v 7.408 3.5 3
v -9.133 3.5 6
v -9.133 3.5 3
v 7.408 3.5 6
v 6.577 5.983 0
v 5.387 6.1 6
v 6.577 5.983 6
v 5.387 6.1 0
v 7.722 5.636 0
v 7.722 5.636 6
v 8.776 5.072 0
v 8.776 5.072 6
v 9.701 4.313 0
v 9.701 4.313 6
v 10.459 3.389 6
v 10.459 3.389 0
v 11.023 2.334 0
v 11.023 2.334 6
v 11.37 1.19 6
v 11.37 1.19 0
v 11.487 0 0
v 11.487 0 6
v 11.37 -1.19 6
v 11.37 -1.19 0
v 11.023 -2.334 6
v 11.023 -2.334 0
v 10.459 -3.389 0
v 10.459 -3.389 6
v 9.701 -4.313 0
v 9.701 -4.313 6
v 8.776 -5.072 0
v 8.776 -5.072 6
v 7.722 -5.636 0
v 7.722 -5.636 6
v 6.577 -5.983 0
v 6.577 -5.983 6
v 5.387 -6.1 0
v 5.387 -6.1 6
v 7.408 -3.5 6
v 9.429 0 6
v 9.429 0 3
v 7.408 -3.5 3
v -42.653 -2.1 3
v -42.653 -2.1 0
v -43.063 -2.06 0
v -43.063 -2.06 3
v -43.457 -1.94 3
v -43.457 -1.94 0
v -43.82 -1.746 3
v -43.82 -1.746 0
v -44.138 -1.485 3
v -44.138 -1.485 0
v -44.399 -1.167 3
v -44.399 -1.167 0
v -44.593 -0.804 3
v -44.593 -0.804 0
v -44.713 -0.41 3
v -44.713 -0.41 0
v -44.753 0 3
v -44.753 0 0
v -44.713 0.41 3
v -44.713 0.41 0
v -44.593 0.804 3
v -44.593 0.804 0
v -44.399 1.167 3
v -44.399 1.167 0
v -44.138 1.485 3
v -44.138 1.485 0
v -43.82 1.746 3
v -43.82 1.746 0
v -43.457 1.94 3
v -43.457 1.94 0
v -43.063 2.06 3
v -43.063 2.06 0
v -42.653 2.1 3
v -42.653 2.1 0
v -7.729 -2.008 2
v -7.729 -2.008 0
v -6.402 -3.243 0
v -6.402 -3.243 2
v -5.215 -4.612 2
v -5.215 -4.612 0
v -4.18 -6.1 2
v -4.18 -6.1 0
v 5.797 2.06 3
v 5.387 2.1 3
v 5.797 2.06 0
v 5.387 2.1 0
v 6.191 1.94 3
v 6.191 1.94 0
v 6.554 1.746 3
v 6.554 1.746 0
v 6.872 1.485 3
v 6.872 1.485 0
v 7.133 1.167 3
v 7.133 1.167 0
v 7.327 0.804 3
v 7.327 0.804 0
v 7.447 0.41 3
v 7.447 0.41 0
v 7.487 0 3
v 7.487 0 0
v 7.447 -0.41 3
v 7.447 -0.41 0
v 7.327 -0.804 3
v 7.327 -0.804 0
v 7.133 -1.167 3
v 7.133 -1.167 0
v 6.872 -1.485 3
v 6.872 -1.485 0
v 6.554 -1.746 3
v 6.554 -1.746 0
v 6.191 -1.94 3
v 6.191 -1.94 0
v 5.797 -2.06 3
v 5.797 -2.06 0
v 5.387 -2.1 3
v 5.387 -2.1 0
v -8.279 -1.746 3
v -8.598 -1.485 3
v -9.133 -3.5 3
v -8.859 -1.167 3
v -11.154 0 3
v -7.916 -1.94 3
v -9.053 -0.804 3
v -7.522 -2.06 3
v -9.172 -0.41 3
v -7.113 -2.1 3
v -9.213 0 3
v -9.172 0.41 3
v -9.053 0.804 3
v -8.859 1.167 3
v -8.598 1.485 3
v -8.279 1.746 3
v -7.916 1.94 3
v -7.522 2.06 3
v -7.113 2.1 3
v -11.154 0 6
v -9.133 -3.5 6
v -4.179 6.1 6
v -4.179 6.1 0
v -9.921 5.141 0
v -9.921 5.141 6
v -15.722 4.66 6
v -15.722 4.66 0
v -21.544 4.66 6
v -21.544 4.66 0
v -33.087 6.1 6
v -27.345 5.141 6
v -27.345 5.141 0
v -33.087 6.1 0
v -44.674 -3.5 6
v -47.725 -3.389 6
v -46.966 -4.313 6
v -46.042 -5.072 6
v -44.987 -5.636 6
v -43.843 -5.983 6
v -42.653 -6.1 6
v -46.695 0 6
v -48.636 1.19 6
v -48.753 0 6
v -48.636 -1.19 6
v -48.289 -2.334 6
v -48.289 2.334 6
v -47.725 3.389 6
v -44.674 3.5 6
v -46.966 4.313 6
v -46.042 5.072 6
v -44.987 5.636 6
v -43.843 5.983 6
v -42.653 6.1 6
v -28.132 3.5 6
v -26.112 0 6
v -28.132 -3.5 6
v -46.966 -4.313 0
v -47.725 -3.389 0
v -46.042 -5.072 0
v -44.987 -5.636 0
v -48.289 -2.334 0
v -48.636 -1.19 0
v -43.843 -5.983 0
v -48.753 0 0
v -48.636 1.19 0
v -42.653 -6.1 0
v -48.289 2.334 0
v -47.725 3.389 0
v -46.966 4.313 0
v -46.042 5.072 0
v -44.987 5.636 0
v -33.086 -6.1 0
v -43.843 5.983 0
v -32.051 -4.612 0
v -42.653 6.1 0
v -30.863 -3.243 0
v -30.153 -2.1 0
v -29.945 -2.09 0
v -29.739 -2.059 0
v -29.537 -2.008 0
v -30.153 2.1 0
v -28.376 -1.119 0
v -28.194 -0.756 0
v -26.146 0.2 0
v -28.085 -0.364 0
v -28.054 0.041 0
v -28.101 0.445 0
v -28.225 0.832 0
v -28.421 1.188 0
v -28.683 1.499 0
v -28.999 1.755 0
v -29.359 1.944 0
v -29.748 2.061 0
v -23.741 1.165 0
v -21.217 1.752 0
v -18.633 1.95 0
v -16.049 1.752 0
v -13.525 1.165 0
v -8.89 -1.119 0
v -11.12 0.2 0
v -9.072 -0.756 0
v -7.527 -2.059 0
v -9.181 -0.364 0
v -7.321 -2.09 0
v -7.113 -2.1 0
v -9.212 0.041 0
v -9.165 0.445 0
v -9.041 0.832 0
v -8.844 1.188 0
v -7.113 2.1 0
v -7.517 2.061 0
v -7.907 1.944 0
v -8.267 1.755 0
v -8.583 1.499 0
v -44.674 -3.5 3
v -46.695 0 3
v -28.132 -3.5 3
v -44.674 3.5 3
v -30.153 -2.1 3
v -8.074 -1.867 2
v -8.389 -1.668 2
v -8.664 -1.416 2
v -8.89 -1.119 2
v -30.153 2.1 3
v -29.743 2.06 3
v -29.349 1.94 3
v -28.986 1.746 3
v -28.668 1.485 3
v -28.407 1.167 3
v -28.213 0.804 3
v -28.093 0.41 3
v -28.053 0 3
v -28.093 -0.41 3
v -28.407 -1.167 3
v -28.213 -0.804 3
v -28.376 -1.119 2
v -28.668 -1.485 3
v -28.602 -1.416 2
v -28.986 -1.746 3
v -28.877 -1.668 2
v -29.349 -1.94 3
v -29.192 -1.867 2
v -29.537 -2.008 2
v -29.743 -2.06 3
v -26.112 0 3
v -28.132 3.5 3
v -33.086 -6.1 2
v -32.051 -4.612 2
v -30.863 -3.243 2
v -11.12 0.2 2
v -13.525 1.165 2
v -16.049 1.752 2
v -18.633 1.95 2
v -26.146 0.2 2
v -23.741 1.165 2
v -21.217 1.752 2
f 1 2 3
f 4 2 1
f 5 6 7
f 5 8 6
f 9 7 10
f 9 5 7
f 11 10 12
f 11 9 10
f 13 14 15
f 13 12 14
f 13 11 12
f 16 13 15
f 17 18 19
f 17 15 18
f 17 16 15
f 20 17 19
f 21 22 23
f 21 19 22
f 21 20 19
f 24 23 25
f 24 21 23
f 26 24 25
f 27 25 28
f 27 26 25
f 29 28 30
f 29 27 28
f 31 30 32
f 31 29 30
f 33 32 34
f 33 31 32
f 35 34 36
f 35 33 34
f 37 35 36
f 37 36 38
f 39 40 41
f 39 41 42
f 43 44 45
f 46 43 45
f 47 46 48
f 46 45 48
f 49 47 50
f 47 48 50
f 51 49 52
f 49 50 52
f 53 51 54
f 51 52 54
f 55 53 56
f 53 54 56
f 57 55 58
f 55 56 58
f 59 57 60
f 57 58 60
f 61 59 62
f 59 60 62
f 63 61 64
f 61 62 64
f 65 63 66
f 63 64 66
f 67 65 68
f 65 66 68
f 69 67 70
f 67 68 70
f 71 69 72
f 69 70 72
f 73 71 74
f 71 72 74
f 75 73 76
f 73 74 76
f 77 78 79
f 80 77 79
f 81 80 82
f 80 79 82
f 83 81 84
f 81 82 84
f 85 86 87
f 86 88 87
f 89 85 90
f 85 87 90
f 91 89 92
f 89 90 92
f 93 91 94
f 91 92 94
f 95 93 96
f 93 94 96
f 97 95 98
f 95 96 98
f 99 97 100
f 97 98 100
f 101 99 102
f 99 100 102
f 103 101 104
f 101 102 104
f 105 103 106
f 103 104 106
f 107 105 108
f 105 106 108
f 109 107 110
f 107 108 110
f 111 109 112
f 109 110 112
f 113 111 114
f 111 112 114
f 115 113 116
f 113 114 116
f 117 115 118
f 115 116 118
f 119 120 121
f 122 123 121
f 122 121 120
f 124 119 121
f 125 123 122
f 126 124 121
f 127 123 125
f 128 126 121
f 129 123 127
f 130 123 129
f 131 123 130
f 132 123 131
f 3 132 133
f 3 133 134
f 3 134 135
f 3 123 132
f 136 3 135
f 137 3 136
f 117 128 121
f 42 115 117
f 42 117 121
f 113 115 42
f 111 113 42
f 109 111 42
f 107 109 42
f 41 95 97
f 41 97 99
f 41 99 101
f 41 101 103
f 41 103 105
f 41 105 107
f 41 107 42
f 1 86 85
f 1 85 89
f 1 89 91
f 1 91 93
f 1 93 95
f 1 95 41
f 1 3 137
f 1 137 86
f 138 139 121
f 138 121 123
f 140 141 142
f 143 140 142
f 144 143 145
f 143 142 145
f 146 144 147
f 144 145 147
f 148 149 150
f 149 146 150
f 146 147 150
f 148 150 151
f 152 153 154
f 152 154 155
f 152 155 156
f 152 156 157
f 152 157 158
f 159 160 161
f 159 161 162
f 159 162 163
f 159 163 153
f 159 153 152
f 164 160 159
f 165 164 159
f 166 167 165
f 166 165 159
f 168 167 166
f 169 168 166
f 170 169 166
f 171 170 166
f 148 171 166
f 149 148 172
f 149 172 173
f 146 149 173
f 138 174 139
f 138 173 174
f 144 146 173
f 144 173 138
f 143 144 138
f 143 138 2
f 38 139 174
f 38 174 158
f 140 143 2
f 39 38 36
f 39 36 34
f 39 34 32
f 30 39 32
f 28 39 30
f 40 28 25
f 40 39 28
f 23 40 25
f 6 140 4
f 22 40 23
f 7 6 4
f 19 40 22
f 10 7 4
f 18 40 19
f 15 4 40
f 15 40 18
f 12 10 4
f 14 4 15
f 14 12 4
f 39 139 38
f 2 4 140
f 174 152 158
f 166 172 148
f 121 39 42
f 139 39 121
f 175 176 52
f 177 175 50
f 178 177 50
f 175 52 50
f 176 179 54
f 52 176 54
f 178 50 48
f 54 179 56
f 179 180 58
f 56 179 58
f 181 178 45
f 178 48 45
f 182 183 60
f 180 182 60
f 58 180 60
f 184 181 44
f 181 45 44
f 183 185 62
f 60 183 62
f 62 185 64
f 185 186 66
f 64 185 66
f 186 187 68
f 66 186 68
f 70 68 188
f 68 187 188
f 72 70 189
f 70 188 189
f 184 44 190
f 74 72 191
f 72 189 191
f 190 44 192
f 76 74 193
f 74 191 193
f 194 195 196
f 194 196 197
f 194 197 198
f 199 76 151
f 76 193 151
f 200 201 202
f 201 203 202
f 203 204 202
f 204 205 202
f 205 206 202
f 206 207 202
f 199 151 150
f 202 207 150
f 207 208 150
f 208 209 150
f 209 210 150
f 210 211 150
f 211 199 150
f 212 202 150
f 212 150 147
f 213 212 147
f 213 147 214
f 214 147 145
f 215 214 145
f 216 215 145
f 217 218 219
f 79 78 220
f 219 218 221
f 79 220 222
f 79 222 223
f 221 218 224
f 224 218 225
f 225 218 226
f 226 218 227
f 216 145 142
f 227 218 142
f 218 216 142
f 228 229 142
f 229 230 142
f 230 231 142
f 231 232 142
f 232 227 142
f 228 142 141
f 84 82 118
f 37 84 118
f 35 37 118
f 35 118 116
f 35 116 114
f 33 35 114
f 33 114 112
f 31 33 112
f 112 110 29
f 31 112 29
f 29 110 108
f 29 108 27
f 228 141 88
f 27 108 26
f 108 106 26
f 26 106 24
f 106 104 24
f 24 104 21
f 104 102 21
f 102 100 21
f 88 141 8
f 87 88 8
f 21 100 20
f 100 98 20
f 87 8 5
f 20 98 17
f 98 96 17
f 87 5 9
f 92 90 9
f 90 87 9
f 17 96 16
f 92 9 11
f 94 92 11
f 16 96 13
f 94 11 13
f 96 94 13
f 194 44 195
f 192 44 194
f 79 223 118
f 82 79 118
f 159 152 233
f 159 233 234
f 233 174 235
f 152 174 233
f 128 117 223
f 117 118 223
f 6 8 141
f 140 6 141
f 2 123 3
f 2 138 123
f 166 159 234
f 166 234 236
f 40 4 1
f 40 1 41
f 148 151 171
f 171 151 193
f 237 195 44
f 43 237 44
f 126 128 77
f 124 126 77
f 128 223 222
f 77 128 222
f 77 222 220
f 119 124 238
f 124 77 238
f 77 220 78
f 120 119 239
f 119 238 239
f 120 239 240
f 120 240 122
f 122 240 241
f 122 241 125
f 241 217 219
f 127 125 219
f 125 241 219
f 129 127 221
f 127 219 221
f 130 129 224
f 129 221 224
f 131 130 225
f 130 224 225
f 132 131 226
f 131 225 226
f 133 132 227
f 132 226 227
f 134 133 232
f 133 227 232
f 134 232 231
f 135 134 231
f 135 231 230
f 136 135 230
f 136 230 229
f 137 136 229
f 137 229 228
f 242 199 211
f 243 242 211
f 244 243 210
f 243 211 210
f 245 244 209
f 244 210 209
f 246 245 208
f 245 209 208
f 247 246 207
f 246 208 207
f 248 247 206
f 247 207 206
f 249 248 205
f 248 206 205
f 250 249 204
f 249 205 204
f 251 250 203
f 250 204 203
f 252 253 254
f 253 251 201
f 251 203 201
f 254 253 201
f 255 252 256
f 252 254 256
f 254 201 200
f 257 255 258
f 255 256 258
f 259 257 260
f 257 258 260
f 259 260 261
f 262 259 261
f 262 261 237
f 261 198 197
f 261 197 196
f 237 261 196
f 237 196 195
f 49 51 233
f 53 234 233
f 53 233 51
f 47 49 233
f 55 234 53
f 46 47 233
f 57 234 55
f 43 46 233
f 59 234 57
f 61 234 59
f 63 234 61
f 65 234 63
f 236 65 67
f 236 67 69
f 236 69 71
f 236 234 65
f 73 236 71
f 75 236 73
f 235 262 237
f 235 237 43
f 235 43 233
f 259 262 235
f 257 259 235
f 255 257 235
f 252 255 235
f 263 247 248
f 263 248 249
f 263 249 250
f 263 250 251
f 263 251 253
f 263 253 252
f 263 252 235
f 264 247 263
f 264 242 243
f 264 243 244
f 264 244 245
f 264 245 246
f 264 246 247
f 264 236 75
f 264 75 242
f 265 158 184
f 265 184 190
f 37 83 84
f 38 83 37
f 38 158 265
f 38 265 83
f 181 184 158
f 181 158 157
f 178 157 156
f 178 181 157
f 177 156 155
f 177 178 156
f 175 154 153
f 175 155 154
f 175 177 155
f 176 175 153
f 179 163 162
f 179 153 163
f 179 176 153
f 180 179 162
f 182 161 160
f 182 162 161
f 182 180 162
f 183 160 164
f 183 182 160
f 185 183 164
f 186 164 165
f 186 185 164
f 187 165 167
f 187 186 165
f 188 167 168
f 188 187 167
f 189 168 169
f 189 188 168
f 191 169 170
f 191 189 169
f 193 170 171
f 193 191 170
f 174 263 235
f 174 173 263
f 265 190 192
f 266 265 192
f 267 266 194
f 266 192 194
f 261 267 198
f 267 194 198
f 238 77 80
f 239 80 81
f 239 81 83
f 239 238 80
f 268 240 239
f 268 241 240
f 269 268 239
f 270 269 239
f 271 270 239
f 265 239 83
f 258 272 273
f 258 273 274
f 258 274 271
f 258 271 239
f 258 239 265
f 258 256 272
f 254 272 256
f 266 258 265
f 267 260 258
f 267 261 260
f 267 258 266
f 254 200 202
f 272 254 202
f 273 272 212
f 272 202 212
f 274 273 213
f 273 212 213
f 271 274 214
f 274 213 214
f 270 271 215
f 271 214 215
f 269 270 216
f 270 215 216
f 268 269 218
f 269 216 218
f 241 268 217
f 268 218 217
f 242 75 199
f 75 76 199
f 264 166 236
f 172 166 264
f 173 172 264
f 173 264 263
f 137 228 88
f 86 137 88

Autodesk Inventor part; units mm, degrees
ref_plane "YZ Plane" through (0, 0, 0) normal (1, 0, 0) x (0, 1, 0)
ref_plane "XZ Plane" through (0, 0, 0) normal (0, 1, 0) x (-1, 0, 0)
ref_plane "XY Plane" through (0, 0, 0) normal (0, 0, 1) x (1, 0, 0)
sketch "Skizze1" plane through (0, 0, 0) normal (0, 0, 1) x (1, 0, 0)
  line L0 (-30.1531, -2.1) -> (-42.6531, -2.1) projected
  arc A0 (-42.6531, 2.1) -> (-42.6531, -2.1) centre (-42.6531, 0) ccw projected
  line L1 (-42.6531, 2.1) -> (-30.1531, 2.1) projected
  arc A1 (-30.1531, -2.1) -> (-30.1531, 2.1) centre (-30.1531, 0) ccw projected
  arc A2 (-7.1127, 2.1) -> (-7.1127, -2.1) centre (-7.1127, 0) ccw projected
  line L2 (-7.1127, 2.1) -> (5.3873, 2.1) projected
  arc A3 (5.3873, -2.1) -> (5.3873, 2.1) centre (5.3873, 0) ccw projected
  line L3 (5.3873, -2.1) -> (-7.1127, -2.1) projected
  circle A4 centre (-18.6329, -15.05) radius 14 projected
  circle A5 centre (-18.6329, 73.2719) radius 11.05 projected
  arc A6 (19.5363, 49.4369) -> (23.7773, 46.7885) centre (21.6568, 48.1127) ccw projected
  arc A7 (19.5363, 49.4369) -> (-57.3137, 50.2763) centre (-18.6329, 73.2719) ccw projected
  spline S0 degree 3 poles (-57.3137, 50.2763) (-57.1415, 49.9867) (-56.9966, 49.6783) (-56.7784, 49.0519) (-56.7017, 48.7303) (-56.6239, 48.0366) (-56.6345, 47.6574) (-56.7807, 47.0301) (-56.8829, 46.7742) (-57.1624, 46.3502) (-57.3235, 46.1805) (-57.5157, 46.0459) knots 0 0 0 0 0.100197 0.100197 0.197338 0.197338 0.308151 0.308151 0.389963 0.389963 0.460336 0.460336 0.460336 0.460336 projected
  line L4 (-57.5157, 46.0459) -> (-57.5426, 46.0271) projected
  ellipse E0 centre (-59.5705, 48.9232) end of major axis (-61.5984, 51.8193) minor radius 2.5 (-61.0744, 46.8387) -> (-57.5426, 46.0271) ccw projected
  arc A8 (23.7773, 46.7885) -> (-61.0744, 46.8387) centre (-18.6329, 73.2719) ccw projected
  line L5 (-0.8579, 86.6698) -> (-3.6329, 85.0676) projected
  line L6 (-3.6329, 85.0676) -> (-6.4079, 86.6698) projected
  line L7 (-6.4079, 86.6698) -> (-6.4079, 89.8741) projected
  line L8 (-6.4079, 89.8741) -> (-3.6329, 91.4762) projected
  line L9 (-3.6329, 91.4762) -> (-0.8579, 89.8741) projected
  line L10 (-0.8579, 89.8741) -> (-0.8579, 86.6698) projected
  line L11 (-6.4079, 59.8741) -> (-3.6329, 61.4762) projected
  line L12 (-3.6329, 61.4762) -> (-0.8579, 59.8741) projected
  line L13 (-0.8579, 59.8741) -> (-0.8579, 56.6698) projected
  line L14 (-0.8579, 56.6698) -> (-3.6329, 55.0676) projected
  line L15 (-3.6329, 55.0676) -> (-6.4079, 56.6698) projected
  line L16 (-6.4079, 56.6698) -> (-6.4079, 59.8741) projected
  line L17 (-36.4079, 59.8741) -> (-33.6329, 61.4762) projected
  line L18 (-33.6329, 61.4762) -> (-30.8579, 59.8741) projected
  line L19 (-30.8579, 59.8741) -> (-30.8579, 56.6698) projected
  line L20 (-30.8579, 56.6698) -> (-33.6329, 55.0676) projected
  line L21 (-33.6329, 55.0676) -> (-36.4079, 56.6698) projected
  line L22 (-36.4079, 56.6698) -> (-36.4079, 59.8741) projected
  line L23 (-30.8579, 86.6698) -> (-33.6329, 85.0676) projected
  line L24 (-33.6329, 85.0676) -> (-36.4079, 86.6698) projected
  line L25 (-36.4079, 86.6698) -> (-36.4079, 89.8741) projected
  line L26 (-36.4079, 89.8741) -> (-33.6329, 91.4762) projected
  line L27 (-33.6329, 91.4762) -> (-30.8579, 89.8741) projected
  line L28 (-30.8579, 89.8741) -> (-30.8579, 86.6698) projected
  line L29 (-21.6329, -35.1) -> (-21.6329, -48.7281) projected
  line L30 (-15.6329, -48.7281) -> (-21.6329, -48.7281) projected
  line L31 (-15.6329, -35.1) -> (-15.6329, -48.7281) projected
  line L32 (-3.5829, -35.1) -> (-15.6329, -35.1) projected
  arc A9 (-3.5829, -35.1) -> (1.4171, -30.1) centre (-3.5829, -30.1) ccw projected
  line L33 (1.4171, -22.1174) -> (1.4171, -30.1) projected
  spline S1 degree 3 poles (5.4171, -15.0509) (5.4147, -15.0534) (5.4123, -15.0559) (4.6387, -15.8583) (3.8622, -16.6655) (2.6723, -18.2412) (2.1512, -19.0655) (1.5603, -20.6885) (1.4171, -21.3977) (1.4171, -22.1174) knots 0 0 0 0 0.0012 0.0012 0.384075 0.384075 0.683828 0.683828 0.899728 0.899728 0.899728 0.899728 projected
  arc A10 (48.8863, -32.4077) -> (5.4171, -15.0509) centre (-18.6329, -138.3947) ccw projected
  spline S2 degree 3 poles (46.6689, -28.6102) (46.687, -28.6358) (46.7052, -28.6619) (47.5464, -29.8644) (48.2846, -31.1065) (48.8863, -32.4077) knots 0 0 0 0 0.009408 0.009408 0.428044 0.428044 0.428044 0.428044 projected
  spline S3 degree 3 poles (46.3671, 73.2719) (46.3671, 69.062) (45.5995, 65.0904) (43.0366, 57.3871) (41.3844, 53.8297) (36.5234, 43.9303) (33.0874, 37.527) (29.4142, 24.4534) (28.6107, 18.1121) (30.256, 4.2032) (32.4354, -3.9552) (40.4412, -19.2682) (43.5252, -24.1471) (46.6689, -28.6102) knots -13.775579 -13.775579 -13.775579 -13.775579 -11.916531 -11.916531 -10.206507 -10.206507 -7.199912 -7.199912 -4.876321 -4.876321 -2.796234 -2.796234 -1.753011 -1.753011 -1.753011 -1.753011 projected
  arc A11 (46.3671, 73.2719) -> (-83.6329, 73.2719) centre (-18.6329, 73.2719) ccw projected
  spline S4 degree 3 poles (-83.9347, -28.6102) (-82.7069, -26.8671) (-81.4925, -25.0666) (-75.3921, -15.5288) (-70.9948, -6.9499) (-66.4184, 9.431) (-66.0615, 15.8887) (-67.4531, 29.6924) (-70.2546, 36.5869) (-76.2635, 49.1483) (-79.4526, 54.8792) (-82.8508, 65.0165) (-83.6329, 69.0218) (-83.6329, 73.2719) knots -8.648216 -8.648216 -8.648216 -8.648216 -8.254246 -8.254246 -6.614154 -6.614154 -5.212744 -5.212744 -3.192896 -3.192896 -1.275036 -1.275036 0 0 0 0 projected
  spline S5 degree 3 poles (-86.1522, -32.4077) (-85.9485, -31.9672) (-85.7293, -31.5338) (-85.2658, -30.6848) (-85.0214, -30.2686) (-84.6343, -29.6497) (-84.4998, -29.4414) (-84.293, -29.1304) (-84.2227, -29.0263) (-84.116, -28.8704) (-84.0801, -28.8184) (-84.0259, -28.7403) (-84.0078, -28.7143) (-83.9711, -28.6619) (-83.9528, -28.6358) (-83.9347, -28.6102) knots 0.128552 0.128552 0.128552 0.128552 0.274044 0.274044 0.418651 0.418651 0.49297 0.49297 0.530648 0.530648 0.549617 0.549617 0.559135 0.559135 0.568808 0.568808 0.568808 0.568808 projected
  arc A12 (-42.6829, -15.0509) -> (-86.1522, -32.4077) centre (-18.6329, -138.3947) ccw projected
  spline S6 degree 3 poles (-38.6829, -22.1174) (-38.6829, -21.3977) (-38.8261, -20.6885) (-39.4171, -19.0655) (-39.9382, -18.2412) (-41.128, -16.6655) (-41.9045, -15.8583) (-42.6781, -15.0559) (-42.6805, -15.0534) (-42.6829, -15.0509) knots -0.001044 -0.001044 -0.001044 -0.001044 0.186915 0.186915 0.447875 0.447875 0.7812 0.7812 0.782245 0.782245 0.782245 0.782245 projected
  line L34 (-38.6829, -30.1) -> (-38.6829, -22.1174) projected
  arc A13 (-38.6829, -30.1) -> (-33.6829, -35.1) centre (-33.6829, -30.1) ccw projected
  line L35 (-21.6329, -35.1) -> (-33.6829, -35.1) projected
  arc A14 (11.642, 130.7909) -> (11.642, 15.753) centre (-18.6329, 73.2719) ccw projected
  spline S7 degree 3 poles (12.5639, 132.5424) (6.5678, 135.6985) (0.1274, 137.9264) (-13.2016, 140.3737) (-20.0134, 140.579) (-35.3971, 138.7033) (-43.7658, 135.9668) (-58.983, 127.4399) (-65.6862, 121.7311) (-76.5269, 108.0654) (-80.5608, 100.2392) (-85.4017, 83.481) (-86.1624, 74.7092) (-84.2786, 57.3678) (-81.6522, 48.964) (-73.3257, 33.6361) (-67.7054, 26.8586) (-54.1831, 15.8395) (-46.4105, 11.7032) (-29.7172, 6.6428) (-20.9562, 5.7671) (-3.5916, 7.4232) (4.846, 9.9391) (12.5639, 14.0014) knots -27.614157 -27.614157 -27.614157 -27.614157 -25.581379 -25.581379 -23.548602 -23.548602 -20.93209 -20.93209 -18.315579 -18.315579 -15.699068 -15.699068 -13.082556 -13.082556 -10.466045 -10.466045 -7.849534 -7.849534 -5.233023 -5.233023 -2.616511 -2.616511 0 0 0 0 projected
  line L36 (-42.6531, 0) -> (5.3873, 0) construction
  line L37 (-42.6531, -6.1) -> (5.3873, -6.1)
  line L38 (5.3873, 6.1) -> (-42.6531, 6.1)
  arc A15 (-42.6531, 6.1) -> (-42.6531, -6.1) centre (-42.6531, 0) ccw
  arc A16 (5.3873, -6.1) -> (5.3873, 6.1) centre (5.3873, 0) ccw
  arc A17 (-4.1788, -6.1) -> (-33.087, -6.1) centre (-18.6329, -40.2677) ccw
  arc A18 (-33.087, 6.1) -> (-4.1788, 6.1) centre (-18.6329, 74.9906) ccw
  line L39 (-18.6329, 6.1) -> (-18.6329, -6.1) construction
  line L40 (-30.1531, 4.6) -> (-7.1127, 4.6) construction
  line L41 (-7.1127, 4.6) -> (-7.1127, -3.1685) construction
  line L42 (-7.1127, -3.1685) -> (-30.1531, -3.1685) construction
  line L43 (-30.1531, -3.1685) -> (-30.1531, 4.6) construction
  line L44 (-33.087, 6.1) -> (-4.1788, 6.1) construction
  line L45 (-4.1788, 6.1) -> (-4.1788, -6.1) construction
  line L46 (-4.1788, -6.1) -> (-33.087, -6.1) construction
  line L47 (-33.087, -6.1) -> (-33.087, 6.1) construction
  point P0 (0, 0)
  point P1 (-3.5829, 0)
  point P2 (-18.6329, 0)
  dimension "d0" = 4
  dimension "d1" = 1.5
extrude "Extrusion1" add sketch "Skizze1" along normal blind 6 contours A17 A4 | A4 A17 L37 A15 L38 A18 A16
sketch "Skizze2" plane through (0, 0, 6) normal (0, 0, 1) x (1, 0, 0)
  arc A0 (-42.6531, 2.1) -> (-42.6531, -2.1) centre (-42.6531, 0) ccw projected
  line L0 (-42.6531, 2.1) -> (-30.1531, 2.1) projected
  arc A1 (-30.1531, -2.1) -> (-30.1531, 2.1) centre (-30.1531, 0) ccw projected
  line L1 (-30.1531, -2.1) -> (-42.6531, -2.1) projected
  arc A2 (-4.1788, -6.1) -> (-33.087, -6.1) centre (-18.6329, -40.2677) ccw projected
  arc A3 (-33.087, 6.1) -> (-4.1788, 6.1) centre (-18.6329, 74.9906) ccw projected
  arc A4 (-42.6531, 6.1) -> (-42.6531, -6.1) centre (-42.6531, 0) ccw projected
  line L2 (-46.6946, 0) -> (-44.6739, 3.5)
  line L3 (-44.6739, 3.5) -> (-40.6324, 3.5)
  line L4 (-40.6324, 3.5) -> (-38.6117, 0)
  line L5 (-38.6117, 0) -> (-40.6324, -3.5)
  line L6 (-40.6324, -3.5) -> (-44.6739, -3.5)
  line L7 (-44.6739, -3.5) -> (-46.6946, 0)
  line L8 (-26.1117, 0) -> (-28.1324, -3.5)
  line L9 (-28.1324, -3.5) -> (-32.1739, -3.5)
  line L10 (-32.1739, -3.5) -> (-34.1946, 0)
  line L11 (-34.1946, 0) -> (-32.1739, 3.5)
  line L12 (-32.1739, 3.5) -> (-28.1324, 3.5)
  line L13 (-28.1324, 3.5) -> (-26.1117, 0)
  line L14 (-40.6324, 3.5) -> (-32.1739, 3.5)
  line L15 (-32.1739, 3.5) -> (-32.1739, -3.5)
  line L16 (-32.1739, -3.5) -> (-40.6324, -3.5)
  line L17 (-40.6324, -3.5) -> (-40.6324, 3.5)
  line L18 (-18.6329, 4.6) -> (-18.6329, -3.1685)
  point P0 (0, 0)
  dimension "d4" = 7
extrude "Extrusion2" cut sketch "Skizze2" against normal blind 3
ref_plane "Arbeitsebene1" through (-18.6329, 4.6, 6) normal (-1, 0, 0) x (0, -1, 0)
mirror "Spiegeln1" about plane through (-18.6329, 4.6, 6) normal (-1, 0, 0) of "Extrusion2"
sketch "Skizze3" plane through (0, 0, 6) normal (0, 0, 1) x (1, 0, 0)
  arc A0 (-4.1788, -6.1) -> (-33.087, -6.1) centre (-18.6329, -40.2677) ccw projected
  line L0 (-4.1788, -6.1) -> (5.3873, -6.1) projected
  line L1 (-33.087, -6.1) -> (-4.1788, -6.1)
  point P0 (0, 0)
extrude "Extrusion3" add sketch "Skizze3" against normal up to surface (6 mm away)
sketch "Skizze4" plane through (0, 0, 0) normal (0, 0, -1) x (-1, 0, 0)
  circle A0 centre (18.6329, -15.05) radius 14 projected
  circle A1 centre (18.6329, -15.05) radius 17
  point P0 (0, 0)
  dimension "d15" = 34
extrude "Extrusion4" cut sketch "Skizze4" against normal blind 2 contours A0 | A1
ref_plane "Arbeitsebene2" through (5.3873, 0, 0) normal (0, -1, 0) x (0, 0, 1)
properties part number "Shoulder_spanner" material "ABS-Kunststoff - Schwarz"
